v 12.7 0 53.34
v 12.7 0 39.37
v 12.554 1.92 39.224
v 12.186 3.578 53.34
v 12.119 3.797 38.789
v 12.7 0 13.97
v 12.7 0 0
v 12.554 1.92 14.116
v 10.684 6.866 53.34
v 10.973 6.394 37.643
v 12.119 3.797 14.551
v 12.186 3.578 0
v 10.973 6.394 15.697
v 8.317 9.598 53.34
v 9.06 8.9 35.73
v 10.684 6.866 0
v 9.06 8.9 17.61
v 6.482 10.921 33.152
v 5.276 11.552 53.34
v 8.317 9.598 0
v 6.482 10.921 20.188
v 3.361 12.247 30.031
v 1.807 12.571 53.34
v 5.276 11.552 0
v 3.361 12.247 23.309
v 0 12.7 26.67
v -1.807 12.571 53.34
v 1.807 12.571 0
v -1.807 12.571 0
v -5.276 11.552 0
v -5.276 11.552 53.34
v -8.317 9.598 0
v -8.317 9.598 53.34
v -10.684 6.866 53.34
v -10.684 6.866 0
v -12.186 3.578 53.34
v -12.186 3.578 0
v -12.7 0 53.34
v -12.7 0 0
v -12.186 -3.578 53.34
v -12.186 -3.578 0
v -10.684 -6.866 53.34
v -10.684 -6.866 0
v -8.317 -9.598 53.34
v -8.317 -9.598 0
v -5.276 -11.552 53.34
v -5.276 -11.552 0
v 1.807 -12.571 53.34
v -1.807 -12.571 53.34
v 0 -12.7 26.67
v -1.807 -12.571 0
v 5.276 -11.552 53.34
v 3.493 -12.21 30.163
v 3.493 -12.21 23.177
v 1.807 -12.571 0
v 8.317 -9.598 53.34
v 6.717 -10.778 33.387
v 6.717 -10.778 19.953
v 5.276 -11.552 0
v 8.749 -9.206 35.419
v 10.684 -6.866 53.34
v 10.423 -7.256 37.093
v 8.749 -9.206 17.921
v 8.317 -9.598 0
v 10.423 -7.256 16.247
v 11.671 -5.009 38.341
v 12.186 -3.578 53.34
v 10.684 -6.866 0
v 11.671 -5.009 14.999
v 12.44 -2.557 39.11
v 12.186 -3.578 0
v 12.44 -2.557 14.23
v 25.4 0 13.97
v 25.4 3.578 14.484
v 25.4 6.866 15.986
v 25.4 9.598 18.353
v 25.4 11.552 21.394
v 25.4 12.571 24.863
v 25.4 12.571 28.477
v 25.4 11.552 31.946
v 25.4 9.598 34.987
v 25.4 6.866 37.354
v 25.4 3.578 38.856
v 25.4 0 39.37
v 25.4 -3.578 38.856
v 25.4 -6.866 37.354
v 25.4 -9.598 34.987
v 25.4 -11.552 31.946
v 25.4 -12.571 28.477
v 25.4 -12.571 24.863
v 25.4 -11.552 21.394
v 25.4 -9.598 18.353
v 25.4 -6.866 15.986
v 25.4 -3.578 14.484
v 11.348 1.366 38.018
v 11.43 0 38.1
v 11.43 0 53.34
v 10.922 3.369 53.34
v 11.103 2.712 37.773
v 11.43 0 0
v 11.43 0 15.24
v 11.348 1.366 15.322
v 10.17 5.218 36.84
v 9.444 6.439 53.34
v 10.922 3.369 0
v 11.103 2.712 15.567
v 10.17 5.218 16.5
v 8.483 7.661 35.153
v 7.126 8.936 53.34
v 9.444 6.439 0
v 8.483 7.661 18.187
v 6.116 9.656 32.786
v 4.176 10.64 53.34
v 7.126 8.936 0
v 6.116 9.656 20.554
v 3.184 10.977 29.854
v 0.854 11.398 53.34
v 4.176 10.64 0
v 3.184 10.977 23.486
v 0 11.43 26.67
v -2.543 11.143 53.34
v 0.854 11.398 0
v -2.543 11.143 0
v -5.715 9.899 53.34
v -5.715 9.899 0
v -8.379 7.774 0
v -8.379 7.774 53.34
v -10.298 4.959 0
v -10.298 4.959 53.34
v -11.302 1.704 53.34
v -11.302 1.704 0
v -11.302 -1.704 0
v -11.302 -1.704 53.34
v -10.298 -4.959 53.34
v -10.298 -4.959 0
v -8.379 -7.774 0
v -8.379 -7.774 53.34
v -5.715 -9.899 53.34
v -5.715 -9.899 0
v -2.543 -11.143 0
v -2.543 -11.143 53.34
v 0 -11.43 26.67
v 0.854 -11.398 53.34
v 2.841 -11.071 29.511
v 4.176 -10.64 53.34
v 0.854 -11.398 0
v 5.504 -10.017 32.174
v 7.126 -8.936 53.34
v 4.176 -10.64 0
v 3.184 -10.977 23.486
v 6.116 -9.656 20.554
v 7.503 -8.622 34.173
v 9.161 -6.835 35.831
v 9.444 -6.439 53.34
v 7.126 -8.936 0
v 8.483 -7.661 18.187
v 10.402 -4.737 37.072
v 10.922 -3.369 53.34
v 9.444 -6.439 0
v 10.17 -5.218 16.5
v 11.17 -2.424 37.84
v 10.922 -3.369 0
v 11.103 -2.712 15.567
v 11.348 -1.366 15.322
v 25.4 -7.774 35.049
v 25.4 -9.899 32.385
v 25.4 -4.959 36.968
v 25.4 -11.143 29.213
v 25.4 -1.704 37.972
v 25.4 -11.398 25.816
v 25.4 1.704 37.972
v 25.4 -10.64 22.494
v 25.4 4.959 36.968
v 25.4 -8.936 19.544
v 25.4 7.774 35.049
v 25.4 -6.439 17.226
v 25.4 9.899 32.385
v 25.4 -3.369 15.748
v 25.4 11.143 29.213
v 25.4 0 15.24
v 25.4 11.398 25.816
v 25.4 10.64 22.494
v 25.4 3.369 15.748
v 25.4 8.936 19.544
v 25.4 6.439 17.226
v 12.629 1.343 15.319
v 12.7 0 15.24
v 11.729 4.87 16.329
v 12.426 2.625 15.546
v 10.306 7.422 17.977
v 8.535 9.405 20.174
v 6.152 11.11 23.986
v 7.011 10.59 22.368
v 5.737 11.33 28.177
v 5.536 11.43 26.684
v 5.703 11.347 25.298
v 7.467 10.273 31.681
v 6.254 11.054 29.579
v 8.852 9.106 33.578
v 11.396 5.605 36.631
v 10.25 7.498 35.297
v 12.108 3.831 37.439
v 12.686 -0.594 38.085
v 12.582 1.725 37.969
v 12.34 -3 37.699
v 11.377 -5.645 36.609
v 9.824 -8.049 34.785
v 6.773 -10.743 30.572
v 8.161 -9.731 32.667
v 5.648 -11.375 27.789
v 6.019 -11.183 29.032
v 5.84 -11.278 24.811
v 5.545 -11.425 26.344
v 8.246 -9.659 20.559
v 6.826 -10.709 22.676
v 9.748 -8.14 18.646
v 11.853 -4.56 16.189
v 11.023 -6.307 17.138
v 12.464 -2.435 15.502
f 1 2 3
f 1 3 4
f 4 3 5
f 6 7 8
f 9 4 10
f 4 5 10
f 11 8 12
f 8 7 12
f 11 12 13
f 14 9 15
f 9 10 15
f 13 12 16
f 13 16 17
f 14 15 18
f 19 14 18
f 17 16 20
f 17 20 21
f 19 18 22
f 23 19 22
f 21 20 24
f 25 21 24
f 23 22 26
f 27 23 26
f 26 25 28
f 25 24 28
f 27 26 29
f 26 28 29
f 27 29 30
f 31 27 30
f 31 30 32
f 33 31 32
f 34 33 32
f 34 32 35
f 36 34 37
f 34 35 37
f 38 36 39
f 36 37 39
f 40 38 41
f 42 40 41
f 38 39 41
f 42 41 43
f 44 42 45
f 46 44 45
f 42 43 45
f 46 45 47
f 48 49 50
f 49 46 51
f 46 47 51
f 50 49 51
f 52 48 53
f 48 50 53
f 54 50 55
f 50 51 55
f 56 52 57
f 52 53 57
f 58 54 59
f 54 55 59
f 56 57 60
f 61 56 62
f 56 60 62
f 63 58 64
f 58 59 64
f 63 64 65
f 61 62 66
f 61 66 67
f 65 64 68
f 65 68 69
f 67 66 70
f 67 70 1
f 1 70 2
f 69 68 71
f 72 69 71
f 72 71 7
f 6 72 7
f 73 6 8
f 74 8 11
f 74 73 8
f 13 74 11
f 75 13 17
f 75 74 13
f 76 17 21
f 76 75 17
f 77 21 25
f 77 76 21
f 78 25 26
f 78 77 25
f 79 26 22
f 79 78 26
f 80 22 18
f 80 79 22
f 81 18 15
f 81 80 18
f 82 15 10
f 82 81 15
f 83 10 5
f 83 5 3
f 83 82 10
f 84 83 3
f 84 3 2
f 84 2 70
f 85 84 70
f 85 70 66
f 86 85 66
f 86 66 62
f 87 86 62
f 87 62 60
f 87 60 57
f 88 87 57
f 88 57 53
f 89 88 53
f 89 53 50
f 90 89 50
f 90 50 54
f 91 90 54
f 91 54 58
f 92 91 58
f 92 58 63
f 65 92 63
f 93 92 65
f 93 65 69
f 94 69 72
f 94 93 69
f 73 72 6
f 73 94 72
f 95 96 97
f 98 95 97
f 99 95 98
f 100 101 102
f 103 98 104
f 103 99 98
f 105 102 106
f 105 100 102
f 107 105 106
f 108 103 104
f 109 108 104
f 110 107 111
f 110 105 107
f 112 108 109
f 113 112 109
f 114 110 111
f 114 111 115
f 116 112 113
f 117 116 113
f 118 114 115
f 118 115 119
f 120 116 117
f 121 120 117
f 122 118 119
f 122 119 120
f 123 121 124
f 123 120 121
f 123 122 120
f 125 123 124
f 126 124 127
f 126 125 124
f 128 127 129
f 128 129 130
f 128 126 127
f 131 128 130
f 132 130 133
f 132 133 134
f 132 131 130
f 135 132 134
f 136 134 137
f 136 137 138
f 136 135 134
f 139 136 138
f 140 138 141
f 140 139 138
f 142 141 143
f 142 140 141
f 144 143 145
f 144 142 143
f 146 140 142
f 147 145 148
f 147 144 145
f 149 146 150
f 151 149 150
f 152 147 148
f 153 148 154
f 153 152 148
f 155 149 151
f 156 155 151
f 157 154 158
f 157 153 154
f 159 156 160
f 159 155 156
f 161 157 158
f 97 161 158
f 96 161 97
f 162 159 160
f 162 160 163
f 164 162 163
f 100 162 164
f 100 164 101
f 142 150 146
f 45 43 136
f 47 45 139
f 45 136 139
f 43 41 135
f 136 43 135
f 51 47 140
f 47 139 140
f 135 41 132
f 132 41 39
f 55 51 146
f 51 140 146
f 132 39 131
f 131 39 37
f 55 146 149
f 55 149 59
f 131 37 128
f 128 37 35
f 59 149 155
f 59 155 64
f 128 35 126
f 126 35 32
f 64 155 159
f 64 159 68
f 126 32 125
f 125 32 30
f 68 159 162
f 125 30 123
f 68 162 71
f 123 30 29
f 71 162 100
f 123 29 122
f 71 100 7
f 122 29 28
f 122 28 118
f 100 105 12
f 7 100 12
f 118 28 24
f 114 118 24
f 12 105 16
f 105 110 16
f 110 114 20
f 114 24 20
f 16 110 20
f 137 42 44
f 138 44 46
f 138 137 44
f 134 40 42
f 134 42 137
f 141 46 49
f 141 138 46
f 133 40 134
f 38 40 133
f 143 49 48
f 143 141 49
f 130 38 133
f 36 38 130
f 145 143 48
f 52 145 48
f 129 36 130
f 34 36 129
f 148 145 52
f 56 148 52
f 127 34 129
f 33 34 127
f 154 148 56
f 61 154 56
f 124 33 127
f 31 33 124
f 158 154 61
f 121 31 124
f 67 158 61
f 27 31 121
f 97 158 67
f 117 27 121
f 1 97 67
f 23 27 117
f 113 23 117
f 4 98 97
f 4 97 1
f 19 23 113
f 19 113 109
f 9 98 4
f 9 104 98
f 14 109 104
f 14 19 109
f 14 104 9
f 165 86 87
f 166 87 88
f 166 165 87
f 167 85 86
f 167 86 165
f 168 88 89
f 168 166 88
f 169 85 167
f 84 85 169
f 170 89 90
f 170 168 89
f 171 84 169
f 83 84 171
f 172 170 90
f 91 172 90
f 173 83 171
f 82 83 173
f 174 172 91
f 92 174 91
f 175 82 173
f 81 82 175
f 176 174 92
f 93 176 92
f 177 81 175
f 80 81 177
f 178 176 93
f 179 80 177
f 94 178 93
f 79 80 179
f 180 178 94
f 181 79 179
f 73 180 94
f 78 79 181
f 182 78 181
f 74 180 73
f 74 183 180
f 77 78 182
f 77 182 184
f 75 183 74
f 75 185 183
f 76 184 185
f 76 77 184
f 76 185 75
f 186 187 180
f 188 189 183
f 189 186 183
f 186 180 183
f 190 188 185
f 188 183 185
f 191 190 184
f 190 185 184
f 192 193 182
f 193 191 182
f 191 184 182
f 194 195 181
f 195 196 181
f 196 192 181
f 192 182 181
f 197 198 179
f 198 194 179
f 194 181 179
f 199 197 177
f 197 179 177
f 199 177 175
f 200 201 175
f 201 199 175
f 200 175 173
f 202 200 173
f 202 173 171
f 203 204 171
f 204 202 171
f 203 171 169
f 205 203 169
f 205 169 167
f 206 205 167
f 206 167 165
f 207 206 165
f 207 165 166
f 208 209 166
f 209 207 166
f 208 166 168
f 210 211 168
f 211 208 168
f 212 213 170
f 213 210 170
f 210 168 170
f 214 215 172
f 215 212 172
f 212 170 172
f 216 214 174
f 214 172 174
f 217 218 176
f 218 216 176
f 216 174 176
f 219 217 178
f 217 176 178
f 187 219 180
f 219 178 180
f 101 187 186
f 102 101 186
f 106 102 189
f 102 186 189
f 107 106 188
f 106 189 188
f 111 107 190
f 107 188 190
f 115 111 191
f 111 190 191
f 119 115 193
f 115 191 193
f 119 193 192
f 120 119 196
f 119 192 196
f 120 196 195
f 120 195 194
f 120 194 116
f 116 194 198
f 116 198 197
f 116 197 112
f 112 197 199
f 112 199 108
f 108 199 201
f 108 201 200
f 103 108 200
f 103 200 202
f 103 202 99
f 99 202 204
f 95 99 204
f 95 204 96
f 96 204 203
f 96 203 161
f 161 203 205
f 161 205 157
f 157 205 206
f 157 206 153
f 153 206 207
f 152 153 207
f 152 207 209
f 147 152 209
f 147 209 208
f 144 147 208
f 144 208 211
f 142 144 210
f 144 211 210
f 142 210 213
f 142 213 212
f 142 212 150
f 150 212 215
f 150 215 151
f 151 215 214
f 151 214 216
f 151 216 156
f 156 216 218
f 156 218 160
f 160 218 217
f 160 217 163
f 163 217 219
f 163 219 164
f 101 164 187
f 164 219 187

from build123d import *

# Parameters (mm, degrees)
SKETCH2_R           = 12.7
SKETCH2_R_2         = 11.43
BOSS_EXTRUDE1_DEPTH = 53.34
SKETCH3_R           = 12.7
SKETCH3_R_2         = 11.43
BOSS_EXTRUDE2_DEPTH = 12.7
BOSS_EXTRUDE3_START = 12.7
SKETCH4_R           = 12.7
SKETCH4_R_2         = 11.43
BOSS_EXTRUDE3_DEPTH = 12.7
SKETCH5_R           = 11.43
CUT_EXTRUDE1_DEPTH  = 25.4
SKETCH6_R           = 11.43
CUT_EXTRUDE2_DEPTH  = 61.428516577


with BuildPart() as part:
    # Sketch2 → Boss-Extrude1 (new body)
    with BuildSketch(Plane.XY):
        Circle(SKETCH2_R)
        Circle(SKETCH2_R_2, mode=Mode.SUBTRACT)
    extrude(amount=BOSS_EXTRUDE1_DEPTH)

    # Sketch3 → Boss-Extrude2 (add)
    with BuildSketch(Plane(origin=(12.7, 0, 0), x_dir=(0, 0, -1), z_dir=(1, 0, 0))):
        with Locations((-26.67, 0)):
            Circle(SKETCH3_R)
        with Locations((-26.67, 0)):
            Circle(SKETCH3_R_2, mode=Mode.SUBTRACT)
    extrude(amount=-BOSS_EXTRUDE2_DEPTH)

    # Sketch4 → Boss-Extrude3 (add)
    with BuildSketch(Plane(origin=(12.7, 0, 0), x_dir=(0, 0, -1), z_dir=(1, 0, 0)).offset(BOSS_EXTRUDE3_START)):
        with Locations((-26.67, 0)):
            Circle(SKETCH4_R)
        with Locations((-26.67, 0)):
            Circle(SKETCH4_R_2, mode=Mode.SUBTRACT)
    extrude(amount=-BOSS_EXTRUDE3_DEPTH)

    # Sketch5 → Cut-Extrude1 (cut)
    with BuildSketch(Plane(origin=(25.4, 0, 0), x_dir=(0, 0, -1), z_dir=(1, 0, 0))):
        with Locations((-26.67, 0)):
            Circle(SKETCH5_R)
    extrude(amount=-CUT_EXTRUDE1_DEPTH, mode=Mode.SUBTRACT)

    # Sketch6 → Cut-Extrude2 (cut, through all)
    with BuildSketch(Plane(origin=(0, 0, 0), x_dir=(-1, 0, 0), z_dir=(0, 0, -1))):
        with Locations(Location((0, 0, 0), (0, 0, 180))):
            Circle(SKETCH6_R)
    extrude(amount=-CUT_EXTRUDE2_DEPTH, mode=Mode.SUBTRACT)


solid = part.part
